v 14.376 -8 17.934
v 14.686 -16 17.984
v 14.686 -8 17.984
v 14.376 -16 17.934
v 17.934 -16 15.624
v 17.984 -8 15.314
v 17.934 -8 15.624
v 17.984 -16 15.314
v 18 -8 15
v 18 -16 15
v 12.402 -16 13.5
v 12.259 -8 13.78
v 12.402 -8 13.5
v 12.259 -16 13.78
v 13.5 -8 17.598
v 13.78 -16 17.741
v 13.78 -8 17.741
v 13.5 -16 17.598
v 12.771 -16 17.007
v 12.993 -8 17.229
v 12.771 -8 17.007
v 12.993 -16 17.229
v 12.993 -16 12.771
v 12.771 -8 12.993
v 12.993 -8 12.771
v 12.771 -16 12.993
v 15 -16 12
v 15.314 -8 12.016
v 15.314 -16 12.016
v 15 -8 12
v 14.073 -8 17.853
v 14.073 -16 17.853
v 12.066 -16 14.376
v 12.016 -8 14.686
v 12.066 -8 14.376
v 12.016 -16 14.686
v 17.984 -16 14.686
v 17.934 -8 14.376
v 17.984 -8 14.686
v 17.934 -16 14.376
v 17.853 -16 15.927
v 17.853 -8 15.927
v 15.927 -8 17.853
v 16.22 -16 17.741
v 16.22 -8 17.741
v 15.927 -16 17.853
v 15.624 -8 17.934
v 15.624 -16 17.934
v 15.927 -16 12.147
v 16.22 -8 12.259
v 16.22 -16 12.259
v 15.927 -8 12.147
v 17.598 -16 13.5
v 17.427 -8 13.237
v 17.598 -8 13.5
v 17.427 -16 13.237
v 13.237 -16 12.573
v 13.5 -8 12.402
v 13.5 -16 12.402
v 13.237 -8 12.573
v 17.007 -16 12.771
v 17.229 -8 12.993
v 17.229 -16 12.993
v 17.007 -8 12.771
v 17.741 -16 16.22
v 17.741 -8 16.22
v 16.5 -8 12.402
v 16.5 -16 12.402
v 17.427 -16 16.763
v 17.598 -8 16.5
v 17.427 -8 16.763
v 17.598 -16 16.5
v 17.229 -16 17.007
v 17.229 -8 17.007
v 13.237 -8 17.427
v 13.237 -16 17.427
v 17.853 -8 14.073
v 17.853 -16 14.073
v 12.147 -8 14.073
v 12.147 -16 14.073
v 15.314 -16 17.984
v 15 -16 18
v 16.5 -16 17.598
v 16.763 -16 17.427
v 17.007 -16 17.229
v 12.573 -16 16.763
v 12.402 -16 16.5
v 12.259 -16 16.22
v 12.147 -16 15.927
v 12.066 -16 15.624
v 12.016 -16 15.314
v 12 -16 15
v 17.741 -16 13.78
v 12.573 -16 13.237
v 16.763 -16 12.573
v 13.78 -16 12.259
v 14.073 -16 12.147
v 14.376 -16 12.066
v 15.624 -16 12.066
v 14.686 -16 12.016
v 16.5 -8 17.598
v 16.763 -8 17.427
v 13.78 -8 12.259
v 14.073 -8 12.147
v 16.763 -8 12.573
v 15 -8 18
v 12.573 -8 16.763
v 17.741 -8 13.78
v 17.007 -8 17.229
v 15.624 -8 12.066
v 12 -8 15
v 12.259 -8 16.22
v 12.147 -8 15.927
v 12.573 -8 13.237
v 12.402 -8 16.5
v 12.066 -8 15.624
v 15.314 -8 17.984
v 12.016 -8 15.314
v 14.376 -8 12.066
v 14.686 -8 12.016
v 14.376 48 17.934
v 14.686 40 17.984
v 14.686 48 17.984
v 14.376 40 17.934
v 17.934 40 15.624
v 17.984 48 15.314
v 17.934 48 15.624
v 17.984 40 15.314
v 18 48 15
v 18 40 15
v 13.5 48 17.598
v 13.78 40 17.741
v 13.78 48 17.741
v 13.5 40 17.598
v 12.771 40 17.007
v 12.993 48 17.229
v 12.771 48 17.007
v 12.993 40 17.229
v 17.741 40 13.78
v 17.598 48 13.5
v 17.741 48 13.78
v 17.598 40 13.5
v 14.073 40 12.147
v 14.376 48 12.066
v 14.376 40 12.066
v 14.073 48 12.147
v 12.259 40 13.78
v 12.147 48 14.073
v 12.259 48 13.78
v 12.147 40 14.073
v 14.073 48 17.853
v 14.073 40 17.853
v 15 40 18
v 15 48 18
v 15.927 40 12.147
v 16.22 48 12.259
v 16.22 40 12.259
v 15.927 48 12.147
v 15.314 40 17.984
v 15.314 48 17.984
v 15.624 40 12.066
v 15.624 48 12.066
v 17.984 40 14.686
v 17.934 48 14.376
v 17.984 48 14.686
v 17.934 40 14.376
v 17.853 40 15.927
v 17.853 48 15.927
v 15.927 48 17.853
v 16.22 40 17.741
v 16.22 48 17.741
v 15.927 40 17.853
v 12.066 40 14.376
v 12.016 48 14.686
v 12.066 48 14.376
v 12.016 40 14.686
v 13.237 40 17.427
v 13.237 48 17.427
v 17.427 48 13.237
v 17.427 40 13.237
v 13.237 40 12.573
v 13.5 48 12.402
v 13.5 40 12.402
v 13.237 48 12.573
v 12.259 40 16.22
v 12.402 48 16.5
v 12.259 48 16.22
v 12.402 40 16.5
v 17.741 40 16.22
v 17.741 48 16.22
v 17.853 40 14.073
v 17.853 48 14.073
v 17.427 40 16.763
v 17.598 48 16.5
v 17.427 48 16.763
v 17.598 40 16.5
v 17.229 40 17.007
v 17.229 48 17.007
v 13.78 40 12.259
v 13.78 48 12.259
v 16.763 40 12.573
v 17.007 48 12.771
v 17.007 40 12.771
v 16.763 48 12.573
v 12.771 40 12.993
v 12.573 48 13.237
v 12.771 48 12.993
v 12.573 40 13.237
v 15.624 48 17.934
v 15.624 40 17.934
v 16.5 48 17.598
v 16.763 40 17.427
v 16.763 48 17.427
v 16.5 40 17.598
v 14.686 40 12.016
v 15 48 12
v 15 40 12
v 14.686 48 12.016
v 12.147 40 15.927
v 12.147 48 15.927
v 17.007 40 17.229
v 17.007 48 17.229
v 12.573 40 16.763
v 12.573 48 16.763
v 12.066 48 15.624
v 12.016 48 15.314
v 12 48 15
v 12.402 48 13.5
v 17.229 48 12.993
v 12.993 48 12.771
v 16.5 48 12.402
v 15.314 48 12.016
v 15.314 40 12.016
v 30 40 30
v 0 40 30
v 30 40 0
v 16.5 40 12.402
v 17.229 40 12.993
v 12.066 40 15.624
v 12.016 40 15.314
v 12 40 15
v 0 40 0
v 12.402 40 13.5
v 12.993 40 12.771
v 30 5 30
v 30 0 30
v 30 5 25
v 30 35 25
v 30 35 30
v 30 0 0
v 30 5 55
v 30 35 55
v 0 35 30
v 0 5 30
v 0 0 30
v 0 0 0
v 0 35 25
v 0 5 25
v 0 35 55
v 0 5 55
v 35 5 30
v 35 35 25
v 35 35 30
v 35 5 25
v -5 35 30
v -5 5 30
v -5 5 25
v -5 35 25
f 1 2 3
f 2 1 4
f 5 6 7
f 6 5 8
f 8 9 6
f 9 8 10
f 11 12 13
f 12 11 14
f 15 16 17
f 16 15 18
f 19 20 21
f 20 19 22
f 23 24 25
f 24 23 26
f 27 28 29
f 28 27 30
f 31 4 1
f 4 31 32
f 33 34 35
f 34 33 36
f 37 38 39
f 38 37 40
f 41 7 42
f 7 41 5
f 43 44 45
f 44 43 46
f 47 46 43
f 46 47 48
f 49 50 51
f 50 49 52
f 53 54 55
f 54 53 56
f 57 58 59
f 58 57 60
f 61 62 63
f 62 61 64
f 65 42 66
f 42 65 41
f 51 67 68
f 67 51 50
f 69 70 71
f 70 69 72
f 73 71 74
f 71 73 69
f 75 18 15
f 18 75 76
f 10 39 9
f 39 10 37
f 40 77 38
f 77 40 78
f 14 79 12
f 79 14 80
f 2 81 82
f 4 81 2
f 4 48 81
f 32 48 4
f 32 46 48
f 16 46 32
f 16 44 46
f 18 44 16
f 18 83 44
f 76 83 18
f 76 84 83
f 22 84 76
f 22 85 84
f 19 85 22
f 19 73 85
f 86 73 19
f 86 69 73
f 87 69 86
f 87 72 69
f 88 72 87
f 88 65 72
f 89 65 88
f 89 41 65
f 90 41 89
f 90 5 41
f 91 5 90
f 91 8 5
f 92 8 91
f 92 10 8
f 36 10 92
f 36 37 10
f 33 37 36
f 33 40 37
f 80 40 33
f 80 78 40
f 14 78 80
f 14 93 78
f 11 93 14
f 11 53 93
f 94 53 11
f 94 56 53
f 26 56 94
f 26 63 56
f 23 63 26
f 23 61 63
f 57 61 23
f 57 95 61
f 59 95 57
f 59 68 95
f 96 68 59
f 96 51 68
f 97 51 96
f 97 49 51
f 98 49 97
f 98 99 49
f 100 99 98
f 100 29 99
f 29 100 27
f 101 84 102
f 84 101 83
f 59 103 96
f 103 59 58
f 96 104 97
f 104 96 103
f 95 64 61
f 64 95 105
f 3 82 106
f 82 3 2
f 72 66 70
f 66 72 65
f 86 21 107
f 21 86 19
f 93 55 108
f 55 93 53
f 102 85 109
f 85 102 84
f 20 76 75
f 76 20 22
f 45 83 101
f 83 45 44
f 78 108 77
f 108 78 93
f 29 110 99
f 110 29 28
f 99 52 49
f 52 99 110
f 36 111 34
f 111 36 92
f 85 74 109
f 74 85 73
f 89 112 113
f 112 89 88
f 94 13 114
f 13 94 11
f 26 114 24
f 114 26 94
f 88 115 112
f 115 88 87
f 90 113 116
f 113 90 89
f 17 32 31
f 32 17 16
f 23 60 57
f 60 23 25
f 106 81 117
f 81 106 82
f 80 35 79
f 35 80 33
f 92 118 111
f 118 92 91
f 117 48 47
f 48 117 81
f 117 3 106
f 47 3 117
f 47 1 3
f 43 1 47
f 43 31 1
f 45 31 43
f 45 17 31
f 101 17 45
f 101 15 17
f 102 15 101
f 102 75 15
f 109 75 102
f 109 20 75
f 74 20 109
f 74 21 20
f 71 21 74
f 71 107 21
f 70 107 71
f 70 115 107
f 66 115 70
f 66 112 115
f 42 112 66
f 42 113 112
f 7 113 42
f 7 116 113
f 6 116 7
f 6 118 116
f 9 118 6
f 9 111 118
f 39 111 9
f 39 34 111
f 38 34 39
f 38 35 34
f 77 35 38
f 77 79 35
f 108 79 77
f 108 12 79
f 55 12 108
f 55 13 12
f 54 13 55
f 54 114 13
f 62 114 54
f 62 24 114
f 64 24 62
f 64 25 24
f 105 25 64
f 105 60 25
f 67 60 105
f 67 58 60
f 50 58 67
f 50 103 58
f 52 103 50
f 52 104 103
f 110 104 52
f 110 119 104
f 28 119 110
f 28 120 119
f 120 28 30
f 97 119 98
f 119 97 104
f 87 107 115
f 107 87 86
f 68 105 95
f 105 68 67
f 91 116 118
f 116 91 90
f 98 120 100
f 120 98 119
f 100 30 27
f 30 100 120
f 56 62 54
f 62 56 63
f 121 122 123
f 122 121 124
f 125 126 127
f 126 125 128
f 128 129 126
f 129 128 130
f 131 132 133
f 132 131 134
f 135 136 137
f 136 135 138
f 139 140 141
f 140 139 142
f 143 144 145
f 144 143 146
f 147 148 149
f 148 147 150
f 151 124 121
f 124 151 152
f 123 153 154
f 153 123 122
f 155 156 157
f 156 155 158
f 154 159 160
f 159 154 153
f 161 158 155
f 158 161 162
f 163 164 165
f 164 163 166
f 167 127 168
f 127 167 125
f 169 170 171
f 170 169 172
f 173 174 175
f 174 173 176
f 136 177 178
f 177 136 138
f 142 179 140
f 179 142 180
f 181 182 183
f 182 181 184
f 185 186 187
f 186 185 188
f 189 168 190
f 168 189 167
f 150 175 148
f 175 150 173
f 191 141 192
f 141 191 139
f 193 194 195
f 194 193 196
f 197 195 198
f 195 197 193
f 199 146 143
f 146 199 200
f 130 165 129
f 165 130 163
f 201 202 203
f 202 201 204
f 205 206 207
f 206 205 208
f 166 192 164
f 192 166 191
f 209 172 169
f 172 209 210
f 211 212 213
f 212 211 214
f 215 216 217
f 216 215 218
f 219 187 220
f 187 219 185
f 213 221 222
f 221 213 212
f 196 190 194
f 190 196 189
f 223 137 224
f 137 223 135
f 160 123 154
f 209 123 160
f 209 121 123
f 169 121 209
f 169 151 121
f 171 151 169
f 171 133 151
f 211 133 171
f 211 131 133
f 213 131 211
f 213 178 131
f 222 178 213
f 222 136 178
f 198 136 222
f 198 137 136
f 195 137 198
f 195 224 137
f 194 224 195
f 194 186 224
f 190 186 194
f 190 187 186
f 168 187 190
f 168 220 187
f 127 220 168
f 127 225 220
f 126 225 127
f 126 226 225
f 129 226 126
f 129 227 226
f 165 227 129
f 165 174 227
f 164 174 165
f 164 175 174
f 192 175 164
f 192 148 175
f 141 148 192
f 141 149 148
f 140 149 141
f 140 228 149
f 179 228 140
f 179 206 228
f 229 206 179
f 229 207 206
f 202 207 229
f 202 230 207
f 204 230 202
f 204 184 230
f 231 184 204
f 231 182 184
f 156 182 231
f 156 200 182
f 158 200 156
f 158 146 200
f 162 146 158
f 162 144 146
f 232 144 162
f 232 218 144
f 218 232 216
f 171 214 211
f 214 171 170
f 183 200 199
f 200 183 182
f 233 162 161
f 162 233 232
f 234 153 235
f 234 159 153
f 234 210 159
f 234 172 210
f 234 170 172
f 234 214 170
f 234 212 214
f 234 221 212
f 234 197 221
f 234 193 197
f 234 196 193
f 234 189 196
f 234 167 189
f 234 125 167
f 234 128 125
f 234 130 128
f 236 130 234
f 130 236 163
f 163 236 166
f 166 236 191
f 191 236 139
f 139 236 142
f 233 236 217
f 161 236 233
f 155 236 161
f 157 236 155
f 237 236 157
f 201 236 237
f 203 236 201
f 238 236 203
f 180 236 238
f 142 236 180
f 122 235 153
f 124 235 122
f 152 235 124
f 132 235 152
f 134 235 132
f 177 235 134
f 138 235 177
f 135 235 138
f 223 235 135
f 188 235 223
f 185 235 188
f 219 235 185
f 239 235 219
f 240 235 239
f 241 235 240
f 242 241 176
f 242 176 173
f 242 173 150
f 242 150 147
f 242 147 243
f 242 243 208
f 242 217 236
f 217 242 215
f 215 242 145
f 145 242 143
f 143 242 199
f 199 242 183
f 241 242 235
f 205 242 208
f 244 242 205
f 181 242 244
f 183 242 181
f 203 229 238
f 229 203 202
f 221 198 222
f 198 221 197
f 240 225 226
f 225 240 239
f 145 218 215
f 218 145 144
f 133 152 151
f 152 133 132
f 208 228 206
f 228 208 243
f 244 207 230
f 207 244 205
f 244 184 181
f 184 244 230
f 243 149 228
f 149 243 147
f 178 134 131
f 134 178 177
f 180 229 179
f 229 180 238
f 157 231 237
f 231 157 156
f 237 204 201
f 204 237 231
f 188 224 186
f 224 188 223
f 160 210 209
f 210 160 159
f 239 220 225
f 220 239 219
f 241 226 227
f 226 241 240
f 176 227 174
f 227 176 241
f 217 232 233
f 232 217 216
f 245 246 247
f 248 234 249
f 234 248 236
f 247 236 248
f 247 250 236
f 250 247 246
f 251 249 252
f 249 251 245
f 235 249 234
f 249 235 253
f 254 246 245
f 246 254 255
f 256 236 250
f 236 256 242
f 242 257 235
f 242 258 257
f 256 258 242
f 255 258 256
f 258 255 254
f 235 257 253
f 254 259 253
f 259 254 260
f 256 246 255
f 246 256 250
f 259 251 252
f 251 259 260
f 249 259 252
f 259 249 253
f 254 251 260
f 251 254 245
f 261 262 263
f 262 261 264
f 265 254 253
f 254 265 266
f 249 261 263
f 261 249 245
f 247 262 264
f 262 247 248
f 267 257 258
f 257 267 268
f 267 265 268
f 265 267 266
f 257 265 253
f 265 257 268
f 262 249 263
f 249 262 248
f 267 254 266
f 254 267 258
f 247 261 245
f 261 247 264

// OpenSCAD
// file: _params.scad
// =========================================================================
// 공유 파라미터 (모든 개별 부품 파일에서 include)
// 메인 어셈블리: cup_z_x_catrage_frame_water_mic_anti_3030.scad 에서 추출
// 프레임: 600 × 420 × 700mm (3030 프로파일, Y=0 대칭)
// =========================================================================

$fn = 60;  // 부품 출력용 고해상도
GLOBAL_TOLERANCE = 0.2;

// --- [1] 하부 기성품 및 원통 파라미터 ---
X_RAIL_LEN = 290.0;
X_BLOCK_W = 30.0; X_BLOCK_L = 32.0;   // 신규 X슬라이더 블록 (폭 30mm × 길이 32mm)
X_PITCH_X = 20.0; X_PITCH_Y = 20.0;   // 체결 홀 피치 (20 × 20mm, M3 나사탭 4개)
X_RAIL_W = 30.0;  X_RAIL_H = 20.0;   // 레일 폭 30mm (레일 바닥~블록 윗면 높이 29mm 반영)
X_TOTAL_H = 29.0;                    // 레일 바닥에서 슬라이더 블록 윗면까지의 높이

MOTOR_W = 42.0;      MOTOR_PITCH = 31.0; MOTOR_HOLE_D = 3.5;    
MOTOR_BOSS_D = 22.0; MOTOR_BOSS_H = 2.0; SCREW_D = 8.0;         
MOT_BODY_L = 41.0;   SHAFT_L = 24.0;     // 실측 NEMA17 몸통 41mm / 축 돌출 24mm

CUP_ID = 99.5;  CUP_WALL = 5.0; CUP_OD = 110.0;     // 아크릴 원통 OD110/ID100
CUP_H = 180.0;   CAGE_H = 60.0;  FLOOR_H = 10.0; PISTON_H = 20.0;     

LIP_D = 30.0;    LIP_H = 5.0;    LEAK_DRAIN_D = 4.0;    
GUIDE_PIPE_D = 8.0; BUSHING_OD = 12.0; BUSHING_H = 8.0;       
DRAIN_RADIUS = 35.0; DRAIN_D = 8.0;        

Y_OFFSET = 85.0; BRKT_H = 12.0; BRKT_D = 122.0; BRKT_ID = 62.0; Z_MOUNT_PCD = 86.0;   

// --- [2] 아크릴 파이프 및 상부 카트리지 ---
ACRYL_ID = 100.0; ACRYL_T = 5.0; ACRYL_OD = ACRYL_ID + (ACRYL_T * 2);  // OD110 (아크릴집 106 재고없음 → 컵과 동일 규격)

REVOLVER_PCD = 240.0;     // 인접 카트리지 웹 9.8mm 확보 (OD110 대응, 230→240)
CARTRIDGE_OD = REVOLVER_PCD + ACRYL_OD + 8; 
TOP_PLATE_H = 15.0;       // 아크릴 15T 통판 (보스홀 단 깊이 10mm)

HUB_D = 60.0;            
SHAFT_D = 12.0;          
HUB_WALL = 4.0;          
HUB_H = 15.0;             // 아크릴 5T × 3장 적층 — 파이프 130mm 대응
POCKET_DEPTH = 5.0;
MID_HUB_Z = 63.5;          // 중단 허브 하면 Z (벨트 중심 Z=71.0mm 정렬, 풀리 상단 Z=75.0mm = 축상단-1mm)
UPPER_HUB_Z = 135.0;       // 상단 허브 하면 Z (전체 135+15=150 유지)
BOSS_OD = 35.0;
BOSS_H = 11.0;             // 보스11 + 와셔1 = 12, 리세스10 → 허브 2mm 공중

// --- [3] GT2 벨트 구동 시스템 ---
GT2_PITCH     = 2.0;
GT2_BELT_W    = 6.0;
BIG_PULLEY_TEETH = 566;
BIG_PULLEY_PD = BIG_PULLEY_TEETH * GT2_PITCH / PI;
BIG_PULLEY_OD = BIG_PULLEY_PD + 1.0;
SMALL_PULLEY_TEETH = 20;
SMALL_PULLEY_PD = SMALL_PULLEY_TEETH * GT2_PITCH / PI;
SMALL_PULLEY_OD = SMALL_PULLEY_PD + 1.0;

BELT_MOTOR_X = -300;
BELT_MOTOR_Y = -155.5;
BRKT_MOTOR_H = 25.0;
BRKT_MOTOR_W = 45.0;        // 브래킷 폭 45mm (프로파일 간섭 회피 복원)
SLOT_LEN = 10.0;
FLAG_W = 15.0;  FLAG_H = 8.0;  FLAG_T = 1.5;

X_POS_MEASURE = 170.0;   // 측정 브래킷 X좌표 (X_M~X_R 정중앙, X대칭)

// --- [4] 3030 프레임 경계 (600×430×700mm) ---
PF = 30;             // 3030 알루미늄 프로파일
WASHER_T = 1.0;     

X_L = -320;
X_M = 60;
X_R = 250;
Y_F = -210;          // 전방 (대칭: -210+30=-180, Y=0 중심)
Y_B = 180;           // 후방 (대칭: 180+30=210, Y=0 중심) — 메인파일과 동기화

Z_BOT = -480;
Z_RAIL = -322;
Z_MID = -TOP_PLATE_H - PF;
Z_TOP = 220;

SUPPORT_PILLAR_H = Z_TOP - PF;

SHAFT_SQ = 20;       // 2020 사각 회전축

// 사각 축 홀 크기
SQ = SHAFT_SQ + GLOBAL_TOLERANCE;  // 20.2mm

// --- 리볼버/컵 축 정렬 (보스홀=판 중심에 리볼버 정렬) ---
REVOLVER_CX = (X_L + X_M + PF)/2;        // 판 중심 = 보스홀 = 리볼버 회전축 (-115)
DROP_X      = REVOLVER_CX + REVOLVER_PCD/2;  // 링 드롭 / 컵 적재 축 (+5)

FLANGE_Z = 52.0;       // 모터 전면 안착 높이 (Z=52mm -> 축 상단 Z=76mm, 풀리 결합)

// --- [5] 모터 체결홀 (이미 제작 완료된 15T 상판 원본 도면 수치 100% 유지) ---
MOTOR_BOLT_PITCH     = 25.0;      // Y피치 (Y = ±12.5mm)
MOTOR_BOLT_X_NOMINAL = X_L + 55;  // 1열: 상판 좌단 55 (모터축 기준 +35mm = X=-265mm)
MOTOR_BOLT_X_SHIFT   = X_L + 40;  // 2열: 상판 좌단 40 (모터축 기준 +20mm = X=-280mm)

// 모터 마운트 볼트 카운터보어 (단볼트용 — 브래킷 두께 25 중 깊게 파냄)
MOTOR_CB_D     = 6.5;            // M3 캡볼트 머리 클리어런스
MOTOR_CB_DEPTH = 19;             // 카운터보어 깊이 (잔여 통과 6mm → M3×10 단볼트)
// main file
// =========================================================================
// [구매] 솔레노이드 밸브 (배수 제어)
// 구매: DC 12V Normally Closed(NC) 솔레노이드 밸브 (입출구 포트: 외경 ø6mm 호스 바브 - 내경 ø5mm 실리콘 튜브용)
// =========================================================================
include <_params.scad>

// 밸브 바디 (황동)
color([0.7, 0.5, 0.2]) cube([30, 40, 30]); 
// 솔레노이드 코일
color([0.1, 0.1, 0.1]) translate([0, 5, 30]) cube([30, 30, 25]); 
// 입출구 니플 (외경 ø6mm 바브 포트)
color([0.6, 0.6, 0.6]) { 
    translate([15, -8, 15]) rotate([90, 0, 0]) cylinder(d=6, h=8); 
    translate([15, 48, 15]) rotate([90, 0, 0]) cylinder(d=6, h=8); 
}
// 마운트 플레이트
color([0.4, 0.4, 0.4]) translate([-5, 5, 25]) cube([40, 30, 5]);
